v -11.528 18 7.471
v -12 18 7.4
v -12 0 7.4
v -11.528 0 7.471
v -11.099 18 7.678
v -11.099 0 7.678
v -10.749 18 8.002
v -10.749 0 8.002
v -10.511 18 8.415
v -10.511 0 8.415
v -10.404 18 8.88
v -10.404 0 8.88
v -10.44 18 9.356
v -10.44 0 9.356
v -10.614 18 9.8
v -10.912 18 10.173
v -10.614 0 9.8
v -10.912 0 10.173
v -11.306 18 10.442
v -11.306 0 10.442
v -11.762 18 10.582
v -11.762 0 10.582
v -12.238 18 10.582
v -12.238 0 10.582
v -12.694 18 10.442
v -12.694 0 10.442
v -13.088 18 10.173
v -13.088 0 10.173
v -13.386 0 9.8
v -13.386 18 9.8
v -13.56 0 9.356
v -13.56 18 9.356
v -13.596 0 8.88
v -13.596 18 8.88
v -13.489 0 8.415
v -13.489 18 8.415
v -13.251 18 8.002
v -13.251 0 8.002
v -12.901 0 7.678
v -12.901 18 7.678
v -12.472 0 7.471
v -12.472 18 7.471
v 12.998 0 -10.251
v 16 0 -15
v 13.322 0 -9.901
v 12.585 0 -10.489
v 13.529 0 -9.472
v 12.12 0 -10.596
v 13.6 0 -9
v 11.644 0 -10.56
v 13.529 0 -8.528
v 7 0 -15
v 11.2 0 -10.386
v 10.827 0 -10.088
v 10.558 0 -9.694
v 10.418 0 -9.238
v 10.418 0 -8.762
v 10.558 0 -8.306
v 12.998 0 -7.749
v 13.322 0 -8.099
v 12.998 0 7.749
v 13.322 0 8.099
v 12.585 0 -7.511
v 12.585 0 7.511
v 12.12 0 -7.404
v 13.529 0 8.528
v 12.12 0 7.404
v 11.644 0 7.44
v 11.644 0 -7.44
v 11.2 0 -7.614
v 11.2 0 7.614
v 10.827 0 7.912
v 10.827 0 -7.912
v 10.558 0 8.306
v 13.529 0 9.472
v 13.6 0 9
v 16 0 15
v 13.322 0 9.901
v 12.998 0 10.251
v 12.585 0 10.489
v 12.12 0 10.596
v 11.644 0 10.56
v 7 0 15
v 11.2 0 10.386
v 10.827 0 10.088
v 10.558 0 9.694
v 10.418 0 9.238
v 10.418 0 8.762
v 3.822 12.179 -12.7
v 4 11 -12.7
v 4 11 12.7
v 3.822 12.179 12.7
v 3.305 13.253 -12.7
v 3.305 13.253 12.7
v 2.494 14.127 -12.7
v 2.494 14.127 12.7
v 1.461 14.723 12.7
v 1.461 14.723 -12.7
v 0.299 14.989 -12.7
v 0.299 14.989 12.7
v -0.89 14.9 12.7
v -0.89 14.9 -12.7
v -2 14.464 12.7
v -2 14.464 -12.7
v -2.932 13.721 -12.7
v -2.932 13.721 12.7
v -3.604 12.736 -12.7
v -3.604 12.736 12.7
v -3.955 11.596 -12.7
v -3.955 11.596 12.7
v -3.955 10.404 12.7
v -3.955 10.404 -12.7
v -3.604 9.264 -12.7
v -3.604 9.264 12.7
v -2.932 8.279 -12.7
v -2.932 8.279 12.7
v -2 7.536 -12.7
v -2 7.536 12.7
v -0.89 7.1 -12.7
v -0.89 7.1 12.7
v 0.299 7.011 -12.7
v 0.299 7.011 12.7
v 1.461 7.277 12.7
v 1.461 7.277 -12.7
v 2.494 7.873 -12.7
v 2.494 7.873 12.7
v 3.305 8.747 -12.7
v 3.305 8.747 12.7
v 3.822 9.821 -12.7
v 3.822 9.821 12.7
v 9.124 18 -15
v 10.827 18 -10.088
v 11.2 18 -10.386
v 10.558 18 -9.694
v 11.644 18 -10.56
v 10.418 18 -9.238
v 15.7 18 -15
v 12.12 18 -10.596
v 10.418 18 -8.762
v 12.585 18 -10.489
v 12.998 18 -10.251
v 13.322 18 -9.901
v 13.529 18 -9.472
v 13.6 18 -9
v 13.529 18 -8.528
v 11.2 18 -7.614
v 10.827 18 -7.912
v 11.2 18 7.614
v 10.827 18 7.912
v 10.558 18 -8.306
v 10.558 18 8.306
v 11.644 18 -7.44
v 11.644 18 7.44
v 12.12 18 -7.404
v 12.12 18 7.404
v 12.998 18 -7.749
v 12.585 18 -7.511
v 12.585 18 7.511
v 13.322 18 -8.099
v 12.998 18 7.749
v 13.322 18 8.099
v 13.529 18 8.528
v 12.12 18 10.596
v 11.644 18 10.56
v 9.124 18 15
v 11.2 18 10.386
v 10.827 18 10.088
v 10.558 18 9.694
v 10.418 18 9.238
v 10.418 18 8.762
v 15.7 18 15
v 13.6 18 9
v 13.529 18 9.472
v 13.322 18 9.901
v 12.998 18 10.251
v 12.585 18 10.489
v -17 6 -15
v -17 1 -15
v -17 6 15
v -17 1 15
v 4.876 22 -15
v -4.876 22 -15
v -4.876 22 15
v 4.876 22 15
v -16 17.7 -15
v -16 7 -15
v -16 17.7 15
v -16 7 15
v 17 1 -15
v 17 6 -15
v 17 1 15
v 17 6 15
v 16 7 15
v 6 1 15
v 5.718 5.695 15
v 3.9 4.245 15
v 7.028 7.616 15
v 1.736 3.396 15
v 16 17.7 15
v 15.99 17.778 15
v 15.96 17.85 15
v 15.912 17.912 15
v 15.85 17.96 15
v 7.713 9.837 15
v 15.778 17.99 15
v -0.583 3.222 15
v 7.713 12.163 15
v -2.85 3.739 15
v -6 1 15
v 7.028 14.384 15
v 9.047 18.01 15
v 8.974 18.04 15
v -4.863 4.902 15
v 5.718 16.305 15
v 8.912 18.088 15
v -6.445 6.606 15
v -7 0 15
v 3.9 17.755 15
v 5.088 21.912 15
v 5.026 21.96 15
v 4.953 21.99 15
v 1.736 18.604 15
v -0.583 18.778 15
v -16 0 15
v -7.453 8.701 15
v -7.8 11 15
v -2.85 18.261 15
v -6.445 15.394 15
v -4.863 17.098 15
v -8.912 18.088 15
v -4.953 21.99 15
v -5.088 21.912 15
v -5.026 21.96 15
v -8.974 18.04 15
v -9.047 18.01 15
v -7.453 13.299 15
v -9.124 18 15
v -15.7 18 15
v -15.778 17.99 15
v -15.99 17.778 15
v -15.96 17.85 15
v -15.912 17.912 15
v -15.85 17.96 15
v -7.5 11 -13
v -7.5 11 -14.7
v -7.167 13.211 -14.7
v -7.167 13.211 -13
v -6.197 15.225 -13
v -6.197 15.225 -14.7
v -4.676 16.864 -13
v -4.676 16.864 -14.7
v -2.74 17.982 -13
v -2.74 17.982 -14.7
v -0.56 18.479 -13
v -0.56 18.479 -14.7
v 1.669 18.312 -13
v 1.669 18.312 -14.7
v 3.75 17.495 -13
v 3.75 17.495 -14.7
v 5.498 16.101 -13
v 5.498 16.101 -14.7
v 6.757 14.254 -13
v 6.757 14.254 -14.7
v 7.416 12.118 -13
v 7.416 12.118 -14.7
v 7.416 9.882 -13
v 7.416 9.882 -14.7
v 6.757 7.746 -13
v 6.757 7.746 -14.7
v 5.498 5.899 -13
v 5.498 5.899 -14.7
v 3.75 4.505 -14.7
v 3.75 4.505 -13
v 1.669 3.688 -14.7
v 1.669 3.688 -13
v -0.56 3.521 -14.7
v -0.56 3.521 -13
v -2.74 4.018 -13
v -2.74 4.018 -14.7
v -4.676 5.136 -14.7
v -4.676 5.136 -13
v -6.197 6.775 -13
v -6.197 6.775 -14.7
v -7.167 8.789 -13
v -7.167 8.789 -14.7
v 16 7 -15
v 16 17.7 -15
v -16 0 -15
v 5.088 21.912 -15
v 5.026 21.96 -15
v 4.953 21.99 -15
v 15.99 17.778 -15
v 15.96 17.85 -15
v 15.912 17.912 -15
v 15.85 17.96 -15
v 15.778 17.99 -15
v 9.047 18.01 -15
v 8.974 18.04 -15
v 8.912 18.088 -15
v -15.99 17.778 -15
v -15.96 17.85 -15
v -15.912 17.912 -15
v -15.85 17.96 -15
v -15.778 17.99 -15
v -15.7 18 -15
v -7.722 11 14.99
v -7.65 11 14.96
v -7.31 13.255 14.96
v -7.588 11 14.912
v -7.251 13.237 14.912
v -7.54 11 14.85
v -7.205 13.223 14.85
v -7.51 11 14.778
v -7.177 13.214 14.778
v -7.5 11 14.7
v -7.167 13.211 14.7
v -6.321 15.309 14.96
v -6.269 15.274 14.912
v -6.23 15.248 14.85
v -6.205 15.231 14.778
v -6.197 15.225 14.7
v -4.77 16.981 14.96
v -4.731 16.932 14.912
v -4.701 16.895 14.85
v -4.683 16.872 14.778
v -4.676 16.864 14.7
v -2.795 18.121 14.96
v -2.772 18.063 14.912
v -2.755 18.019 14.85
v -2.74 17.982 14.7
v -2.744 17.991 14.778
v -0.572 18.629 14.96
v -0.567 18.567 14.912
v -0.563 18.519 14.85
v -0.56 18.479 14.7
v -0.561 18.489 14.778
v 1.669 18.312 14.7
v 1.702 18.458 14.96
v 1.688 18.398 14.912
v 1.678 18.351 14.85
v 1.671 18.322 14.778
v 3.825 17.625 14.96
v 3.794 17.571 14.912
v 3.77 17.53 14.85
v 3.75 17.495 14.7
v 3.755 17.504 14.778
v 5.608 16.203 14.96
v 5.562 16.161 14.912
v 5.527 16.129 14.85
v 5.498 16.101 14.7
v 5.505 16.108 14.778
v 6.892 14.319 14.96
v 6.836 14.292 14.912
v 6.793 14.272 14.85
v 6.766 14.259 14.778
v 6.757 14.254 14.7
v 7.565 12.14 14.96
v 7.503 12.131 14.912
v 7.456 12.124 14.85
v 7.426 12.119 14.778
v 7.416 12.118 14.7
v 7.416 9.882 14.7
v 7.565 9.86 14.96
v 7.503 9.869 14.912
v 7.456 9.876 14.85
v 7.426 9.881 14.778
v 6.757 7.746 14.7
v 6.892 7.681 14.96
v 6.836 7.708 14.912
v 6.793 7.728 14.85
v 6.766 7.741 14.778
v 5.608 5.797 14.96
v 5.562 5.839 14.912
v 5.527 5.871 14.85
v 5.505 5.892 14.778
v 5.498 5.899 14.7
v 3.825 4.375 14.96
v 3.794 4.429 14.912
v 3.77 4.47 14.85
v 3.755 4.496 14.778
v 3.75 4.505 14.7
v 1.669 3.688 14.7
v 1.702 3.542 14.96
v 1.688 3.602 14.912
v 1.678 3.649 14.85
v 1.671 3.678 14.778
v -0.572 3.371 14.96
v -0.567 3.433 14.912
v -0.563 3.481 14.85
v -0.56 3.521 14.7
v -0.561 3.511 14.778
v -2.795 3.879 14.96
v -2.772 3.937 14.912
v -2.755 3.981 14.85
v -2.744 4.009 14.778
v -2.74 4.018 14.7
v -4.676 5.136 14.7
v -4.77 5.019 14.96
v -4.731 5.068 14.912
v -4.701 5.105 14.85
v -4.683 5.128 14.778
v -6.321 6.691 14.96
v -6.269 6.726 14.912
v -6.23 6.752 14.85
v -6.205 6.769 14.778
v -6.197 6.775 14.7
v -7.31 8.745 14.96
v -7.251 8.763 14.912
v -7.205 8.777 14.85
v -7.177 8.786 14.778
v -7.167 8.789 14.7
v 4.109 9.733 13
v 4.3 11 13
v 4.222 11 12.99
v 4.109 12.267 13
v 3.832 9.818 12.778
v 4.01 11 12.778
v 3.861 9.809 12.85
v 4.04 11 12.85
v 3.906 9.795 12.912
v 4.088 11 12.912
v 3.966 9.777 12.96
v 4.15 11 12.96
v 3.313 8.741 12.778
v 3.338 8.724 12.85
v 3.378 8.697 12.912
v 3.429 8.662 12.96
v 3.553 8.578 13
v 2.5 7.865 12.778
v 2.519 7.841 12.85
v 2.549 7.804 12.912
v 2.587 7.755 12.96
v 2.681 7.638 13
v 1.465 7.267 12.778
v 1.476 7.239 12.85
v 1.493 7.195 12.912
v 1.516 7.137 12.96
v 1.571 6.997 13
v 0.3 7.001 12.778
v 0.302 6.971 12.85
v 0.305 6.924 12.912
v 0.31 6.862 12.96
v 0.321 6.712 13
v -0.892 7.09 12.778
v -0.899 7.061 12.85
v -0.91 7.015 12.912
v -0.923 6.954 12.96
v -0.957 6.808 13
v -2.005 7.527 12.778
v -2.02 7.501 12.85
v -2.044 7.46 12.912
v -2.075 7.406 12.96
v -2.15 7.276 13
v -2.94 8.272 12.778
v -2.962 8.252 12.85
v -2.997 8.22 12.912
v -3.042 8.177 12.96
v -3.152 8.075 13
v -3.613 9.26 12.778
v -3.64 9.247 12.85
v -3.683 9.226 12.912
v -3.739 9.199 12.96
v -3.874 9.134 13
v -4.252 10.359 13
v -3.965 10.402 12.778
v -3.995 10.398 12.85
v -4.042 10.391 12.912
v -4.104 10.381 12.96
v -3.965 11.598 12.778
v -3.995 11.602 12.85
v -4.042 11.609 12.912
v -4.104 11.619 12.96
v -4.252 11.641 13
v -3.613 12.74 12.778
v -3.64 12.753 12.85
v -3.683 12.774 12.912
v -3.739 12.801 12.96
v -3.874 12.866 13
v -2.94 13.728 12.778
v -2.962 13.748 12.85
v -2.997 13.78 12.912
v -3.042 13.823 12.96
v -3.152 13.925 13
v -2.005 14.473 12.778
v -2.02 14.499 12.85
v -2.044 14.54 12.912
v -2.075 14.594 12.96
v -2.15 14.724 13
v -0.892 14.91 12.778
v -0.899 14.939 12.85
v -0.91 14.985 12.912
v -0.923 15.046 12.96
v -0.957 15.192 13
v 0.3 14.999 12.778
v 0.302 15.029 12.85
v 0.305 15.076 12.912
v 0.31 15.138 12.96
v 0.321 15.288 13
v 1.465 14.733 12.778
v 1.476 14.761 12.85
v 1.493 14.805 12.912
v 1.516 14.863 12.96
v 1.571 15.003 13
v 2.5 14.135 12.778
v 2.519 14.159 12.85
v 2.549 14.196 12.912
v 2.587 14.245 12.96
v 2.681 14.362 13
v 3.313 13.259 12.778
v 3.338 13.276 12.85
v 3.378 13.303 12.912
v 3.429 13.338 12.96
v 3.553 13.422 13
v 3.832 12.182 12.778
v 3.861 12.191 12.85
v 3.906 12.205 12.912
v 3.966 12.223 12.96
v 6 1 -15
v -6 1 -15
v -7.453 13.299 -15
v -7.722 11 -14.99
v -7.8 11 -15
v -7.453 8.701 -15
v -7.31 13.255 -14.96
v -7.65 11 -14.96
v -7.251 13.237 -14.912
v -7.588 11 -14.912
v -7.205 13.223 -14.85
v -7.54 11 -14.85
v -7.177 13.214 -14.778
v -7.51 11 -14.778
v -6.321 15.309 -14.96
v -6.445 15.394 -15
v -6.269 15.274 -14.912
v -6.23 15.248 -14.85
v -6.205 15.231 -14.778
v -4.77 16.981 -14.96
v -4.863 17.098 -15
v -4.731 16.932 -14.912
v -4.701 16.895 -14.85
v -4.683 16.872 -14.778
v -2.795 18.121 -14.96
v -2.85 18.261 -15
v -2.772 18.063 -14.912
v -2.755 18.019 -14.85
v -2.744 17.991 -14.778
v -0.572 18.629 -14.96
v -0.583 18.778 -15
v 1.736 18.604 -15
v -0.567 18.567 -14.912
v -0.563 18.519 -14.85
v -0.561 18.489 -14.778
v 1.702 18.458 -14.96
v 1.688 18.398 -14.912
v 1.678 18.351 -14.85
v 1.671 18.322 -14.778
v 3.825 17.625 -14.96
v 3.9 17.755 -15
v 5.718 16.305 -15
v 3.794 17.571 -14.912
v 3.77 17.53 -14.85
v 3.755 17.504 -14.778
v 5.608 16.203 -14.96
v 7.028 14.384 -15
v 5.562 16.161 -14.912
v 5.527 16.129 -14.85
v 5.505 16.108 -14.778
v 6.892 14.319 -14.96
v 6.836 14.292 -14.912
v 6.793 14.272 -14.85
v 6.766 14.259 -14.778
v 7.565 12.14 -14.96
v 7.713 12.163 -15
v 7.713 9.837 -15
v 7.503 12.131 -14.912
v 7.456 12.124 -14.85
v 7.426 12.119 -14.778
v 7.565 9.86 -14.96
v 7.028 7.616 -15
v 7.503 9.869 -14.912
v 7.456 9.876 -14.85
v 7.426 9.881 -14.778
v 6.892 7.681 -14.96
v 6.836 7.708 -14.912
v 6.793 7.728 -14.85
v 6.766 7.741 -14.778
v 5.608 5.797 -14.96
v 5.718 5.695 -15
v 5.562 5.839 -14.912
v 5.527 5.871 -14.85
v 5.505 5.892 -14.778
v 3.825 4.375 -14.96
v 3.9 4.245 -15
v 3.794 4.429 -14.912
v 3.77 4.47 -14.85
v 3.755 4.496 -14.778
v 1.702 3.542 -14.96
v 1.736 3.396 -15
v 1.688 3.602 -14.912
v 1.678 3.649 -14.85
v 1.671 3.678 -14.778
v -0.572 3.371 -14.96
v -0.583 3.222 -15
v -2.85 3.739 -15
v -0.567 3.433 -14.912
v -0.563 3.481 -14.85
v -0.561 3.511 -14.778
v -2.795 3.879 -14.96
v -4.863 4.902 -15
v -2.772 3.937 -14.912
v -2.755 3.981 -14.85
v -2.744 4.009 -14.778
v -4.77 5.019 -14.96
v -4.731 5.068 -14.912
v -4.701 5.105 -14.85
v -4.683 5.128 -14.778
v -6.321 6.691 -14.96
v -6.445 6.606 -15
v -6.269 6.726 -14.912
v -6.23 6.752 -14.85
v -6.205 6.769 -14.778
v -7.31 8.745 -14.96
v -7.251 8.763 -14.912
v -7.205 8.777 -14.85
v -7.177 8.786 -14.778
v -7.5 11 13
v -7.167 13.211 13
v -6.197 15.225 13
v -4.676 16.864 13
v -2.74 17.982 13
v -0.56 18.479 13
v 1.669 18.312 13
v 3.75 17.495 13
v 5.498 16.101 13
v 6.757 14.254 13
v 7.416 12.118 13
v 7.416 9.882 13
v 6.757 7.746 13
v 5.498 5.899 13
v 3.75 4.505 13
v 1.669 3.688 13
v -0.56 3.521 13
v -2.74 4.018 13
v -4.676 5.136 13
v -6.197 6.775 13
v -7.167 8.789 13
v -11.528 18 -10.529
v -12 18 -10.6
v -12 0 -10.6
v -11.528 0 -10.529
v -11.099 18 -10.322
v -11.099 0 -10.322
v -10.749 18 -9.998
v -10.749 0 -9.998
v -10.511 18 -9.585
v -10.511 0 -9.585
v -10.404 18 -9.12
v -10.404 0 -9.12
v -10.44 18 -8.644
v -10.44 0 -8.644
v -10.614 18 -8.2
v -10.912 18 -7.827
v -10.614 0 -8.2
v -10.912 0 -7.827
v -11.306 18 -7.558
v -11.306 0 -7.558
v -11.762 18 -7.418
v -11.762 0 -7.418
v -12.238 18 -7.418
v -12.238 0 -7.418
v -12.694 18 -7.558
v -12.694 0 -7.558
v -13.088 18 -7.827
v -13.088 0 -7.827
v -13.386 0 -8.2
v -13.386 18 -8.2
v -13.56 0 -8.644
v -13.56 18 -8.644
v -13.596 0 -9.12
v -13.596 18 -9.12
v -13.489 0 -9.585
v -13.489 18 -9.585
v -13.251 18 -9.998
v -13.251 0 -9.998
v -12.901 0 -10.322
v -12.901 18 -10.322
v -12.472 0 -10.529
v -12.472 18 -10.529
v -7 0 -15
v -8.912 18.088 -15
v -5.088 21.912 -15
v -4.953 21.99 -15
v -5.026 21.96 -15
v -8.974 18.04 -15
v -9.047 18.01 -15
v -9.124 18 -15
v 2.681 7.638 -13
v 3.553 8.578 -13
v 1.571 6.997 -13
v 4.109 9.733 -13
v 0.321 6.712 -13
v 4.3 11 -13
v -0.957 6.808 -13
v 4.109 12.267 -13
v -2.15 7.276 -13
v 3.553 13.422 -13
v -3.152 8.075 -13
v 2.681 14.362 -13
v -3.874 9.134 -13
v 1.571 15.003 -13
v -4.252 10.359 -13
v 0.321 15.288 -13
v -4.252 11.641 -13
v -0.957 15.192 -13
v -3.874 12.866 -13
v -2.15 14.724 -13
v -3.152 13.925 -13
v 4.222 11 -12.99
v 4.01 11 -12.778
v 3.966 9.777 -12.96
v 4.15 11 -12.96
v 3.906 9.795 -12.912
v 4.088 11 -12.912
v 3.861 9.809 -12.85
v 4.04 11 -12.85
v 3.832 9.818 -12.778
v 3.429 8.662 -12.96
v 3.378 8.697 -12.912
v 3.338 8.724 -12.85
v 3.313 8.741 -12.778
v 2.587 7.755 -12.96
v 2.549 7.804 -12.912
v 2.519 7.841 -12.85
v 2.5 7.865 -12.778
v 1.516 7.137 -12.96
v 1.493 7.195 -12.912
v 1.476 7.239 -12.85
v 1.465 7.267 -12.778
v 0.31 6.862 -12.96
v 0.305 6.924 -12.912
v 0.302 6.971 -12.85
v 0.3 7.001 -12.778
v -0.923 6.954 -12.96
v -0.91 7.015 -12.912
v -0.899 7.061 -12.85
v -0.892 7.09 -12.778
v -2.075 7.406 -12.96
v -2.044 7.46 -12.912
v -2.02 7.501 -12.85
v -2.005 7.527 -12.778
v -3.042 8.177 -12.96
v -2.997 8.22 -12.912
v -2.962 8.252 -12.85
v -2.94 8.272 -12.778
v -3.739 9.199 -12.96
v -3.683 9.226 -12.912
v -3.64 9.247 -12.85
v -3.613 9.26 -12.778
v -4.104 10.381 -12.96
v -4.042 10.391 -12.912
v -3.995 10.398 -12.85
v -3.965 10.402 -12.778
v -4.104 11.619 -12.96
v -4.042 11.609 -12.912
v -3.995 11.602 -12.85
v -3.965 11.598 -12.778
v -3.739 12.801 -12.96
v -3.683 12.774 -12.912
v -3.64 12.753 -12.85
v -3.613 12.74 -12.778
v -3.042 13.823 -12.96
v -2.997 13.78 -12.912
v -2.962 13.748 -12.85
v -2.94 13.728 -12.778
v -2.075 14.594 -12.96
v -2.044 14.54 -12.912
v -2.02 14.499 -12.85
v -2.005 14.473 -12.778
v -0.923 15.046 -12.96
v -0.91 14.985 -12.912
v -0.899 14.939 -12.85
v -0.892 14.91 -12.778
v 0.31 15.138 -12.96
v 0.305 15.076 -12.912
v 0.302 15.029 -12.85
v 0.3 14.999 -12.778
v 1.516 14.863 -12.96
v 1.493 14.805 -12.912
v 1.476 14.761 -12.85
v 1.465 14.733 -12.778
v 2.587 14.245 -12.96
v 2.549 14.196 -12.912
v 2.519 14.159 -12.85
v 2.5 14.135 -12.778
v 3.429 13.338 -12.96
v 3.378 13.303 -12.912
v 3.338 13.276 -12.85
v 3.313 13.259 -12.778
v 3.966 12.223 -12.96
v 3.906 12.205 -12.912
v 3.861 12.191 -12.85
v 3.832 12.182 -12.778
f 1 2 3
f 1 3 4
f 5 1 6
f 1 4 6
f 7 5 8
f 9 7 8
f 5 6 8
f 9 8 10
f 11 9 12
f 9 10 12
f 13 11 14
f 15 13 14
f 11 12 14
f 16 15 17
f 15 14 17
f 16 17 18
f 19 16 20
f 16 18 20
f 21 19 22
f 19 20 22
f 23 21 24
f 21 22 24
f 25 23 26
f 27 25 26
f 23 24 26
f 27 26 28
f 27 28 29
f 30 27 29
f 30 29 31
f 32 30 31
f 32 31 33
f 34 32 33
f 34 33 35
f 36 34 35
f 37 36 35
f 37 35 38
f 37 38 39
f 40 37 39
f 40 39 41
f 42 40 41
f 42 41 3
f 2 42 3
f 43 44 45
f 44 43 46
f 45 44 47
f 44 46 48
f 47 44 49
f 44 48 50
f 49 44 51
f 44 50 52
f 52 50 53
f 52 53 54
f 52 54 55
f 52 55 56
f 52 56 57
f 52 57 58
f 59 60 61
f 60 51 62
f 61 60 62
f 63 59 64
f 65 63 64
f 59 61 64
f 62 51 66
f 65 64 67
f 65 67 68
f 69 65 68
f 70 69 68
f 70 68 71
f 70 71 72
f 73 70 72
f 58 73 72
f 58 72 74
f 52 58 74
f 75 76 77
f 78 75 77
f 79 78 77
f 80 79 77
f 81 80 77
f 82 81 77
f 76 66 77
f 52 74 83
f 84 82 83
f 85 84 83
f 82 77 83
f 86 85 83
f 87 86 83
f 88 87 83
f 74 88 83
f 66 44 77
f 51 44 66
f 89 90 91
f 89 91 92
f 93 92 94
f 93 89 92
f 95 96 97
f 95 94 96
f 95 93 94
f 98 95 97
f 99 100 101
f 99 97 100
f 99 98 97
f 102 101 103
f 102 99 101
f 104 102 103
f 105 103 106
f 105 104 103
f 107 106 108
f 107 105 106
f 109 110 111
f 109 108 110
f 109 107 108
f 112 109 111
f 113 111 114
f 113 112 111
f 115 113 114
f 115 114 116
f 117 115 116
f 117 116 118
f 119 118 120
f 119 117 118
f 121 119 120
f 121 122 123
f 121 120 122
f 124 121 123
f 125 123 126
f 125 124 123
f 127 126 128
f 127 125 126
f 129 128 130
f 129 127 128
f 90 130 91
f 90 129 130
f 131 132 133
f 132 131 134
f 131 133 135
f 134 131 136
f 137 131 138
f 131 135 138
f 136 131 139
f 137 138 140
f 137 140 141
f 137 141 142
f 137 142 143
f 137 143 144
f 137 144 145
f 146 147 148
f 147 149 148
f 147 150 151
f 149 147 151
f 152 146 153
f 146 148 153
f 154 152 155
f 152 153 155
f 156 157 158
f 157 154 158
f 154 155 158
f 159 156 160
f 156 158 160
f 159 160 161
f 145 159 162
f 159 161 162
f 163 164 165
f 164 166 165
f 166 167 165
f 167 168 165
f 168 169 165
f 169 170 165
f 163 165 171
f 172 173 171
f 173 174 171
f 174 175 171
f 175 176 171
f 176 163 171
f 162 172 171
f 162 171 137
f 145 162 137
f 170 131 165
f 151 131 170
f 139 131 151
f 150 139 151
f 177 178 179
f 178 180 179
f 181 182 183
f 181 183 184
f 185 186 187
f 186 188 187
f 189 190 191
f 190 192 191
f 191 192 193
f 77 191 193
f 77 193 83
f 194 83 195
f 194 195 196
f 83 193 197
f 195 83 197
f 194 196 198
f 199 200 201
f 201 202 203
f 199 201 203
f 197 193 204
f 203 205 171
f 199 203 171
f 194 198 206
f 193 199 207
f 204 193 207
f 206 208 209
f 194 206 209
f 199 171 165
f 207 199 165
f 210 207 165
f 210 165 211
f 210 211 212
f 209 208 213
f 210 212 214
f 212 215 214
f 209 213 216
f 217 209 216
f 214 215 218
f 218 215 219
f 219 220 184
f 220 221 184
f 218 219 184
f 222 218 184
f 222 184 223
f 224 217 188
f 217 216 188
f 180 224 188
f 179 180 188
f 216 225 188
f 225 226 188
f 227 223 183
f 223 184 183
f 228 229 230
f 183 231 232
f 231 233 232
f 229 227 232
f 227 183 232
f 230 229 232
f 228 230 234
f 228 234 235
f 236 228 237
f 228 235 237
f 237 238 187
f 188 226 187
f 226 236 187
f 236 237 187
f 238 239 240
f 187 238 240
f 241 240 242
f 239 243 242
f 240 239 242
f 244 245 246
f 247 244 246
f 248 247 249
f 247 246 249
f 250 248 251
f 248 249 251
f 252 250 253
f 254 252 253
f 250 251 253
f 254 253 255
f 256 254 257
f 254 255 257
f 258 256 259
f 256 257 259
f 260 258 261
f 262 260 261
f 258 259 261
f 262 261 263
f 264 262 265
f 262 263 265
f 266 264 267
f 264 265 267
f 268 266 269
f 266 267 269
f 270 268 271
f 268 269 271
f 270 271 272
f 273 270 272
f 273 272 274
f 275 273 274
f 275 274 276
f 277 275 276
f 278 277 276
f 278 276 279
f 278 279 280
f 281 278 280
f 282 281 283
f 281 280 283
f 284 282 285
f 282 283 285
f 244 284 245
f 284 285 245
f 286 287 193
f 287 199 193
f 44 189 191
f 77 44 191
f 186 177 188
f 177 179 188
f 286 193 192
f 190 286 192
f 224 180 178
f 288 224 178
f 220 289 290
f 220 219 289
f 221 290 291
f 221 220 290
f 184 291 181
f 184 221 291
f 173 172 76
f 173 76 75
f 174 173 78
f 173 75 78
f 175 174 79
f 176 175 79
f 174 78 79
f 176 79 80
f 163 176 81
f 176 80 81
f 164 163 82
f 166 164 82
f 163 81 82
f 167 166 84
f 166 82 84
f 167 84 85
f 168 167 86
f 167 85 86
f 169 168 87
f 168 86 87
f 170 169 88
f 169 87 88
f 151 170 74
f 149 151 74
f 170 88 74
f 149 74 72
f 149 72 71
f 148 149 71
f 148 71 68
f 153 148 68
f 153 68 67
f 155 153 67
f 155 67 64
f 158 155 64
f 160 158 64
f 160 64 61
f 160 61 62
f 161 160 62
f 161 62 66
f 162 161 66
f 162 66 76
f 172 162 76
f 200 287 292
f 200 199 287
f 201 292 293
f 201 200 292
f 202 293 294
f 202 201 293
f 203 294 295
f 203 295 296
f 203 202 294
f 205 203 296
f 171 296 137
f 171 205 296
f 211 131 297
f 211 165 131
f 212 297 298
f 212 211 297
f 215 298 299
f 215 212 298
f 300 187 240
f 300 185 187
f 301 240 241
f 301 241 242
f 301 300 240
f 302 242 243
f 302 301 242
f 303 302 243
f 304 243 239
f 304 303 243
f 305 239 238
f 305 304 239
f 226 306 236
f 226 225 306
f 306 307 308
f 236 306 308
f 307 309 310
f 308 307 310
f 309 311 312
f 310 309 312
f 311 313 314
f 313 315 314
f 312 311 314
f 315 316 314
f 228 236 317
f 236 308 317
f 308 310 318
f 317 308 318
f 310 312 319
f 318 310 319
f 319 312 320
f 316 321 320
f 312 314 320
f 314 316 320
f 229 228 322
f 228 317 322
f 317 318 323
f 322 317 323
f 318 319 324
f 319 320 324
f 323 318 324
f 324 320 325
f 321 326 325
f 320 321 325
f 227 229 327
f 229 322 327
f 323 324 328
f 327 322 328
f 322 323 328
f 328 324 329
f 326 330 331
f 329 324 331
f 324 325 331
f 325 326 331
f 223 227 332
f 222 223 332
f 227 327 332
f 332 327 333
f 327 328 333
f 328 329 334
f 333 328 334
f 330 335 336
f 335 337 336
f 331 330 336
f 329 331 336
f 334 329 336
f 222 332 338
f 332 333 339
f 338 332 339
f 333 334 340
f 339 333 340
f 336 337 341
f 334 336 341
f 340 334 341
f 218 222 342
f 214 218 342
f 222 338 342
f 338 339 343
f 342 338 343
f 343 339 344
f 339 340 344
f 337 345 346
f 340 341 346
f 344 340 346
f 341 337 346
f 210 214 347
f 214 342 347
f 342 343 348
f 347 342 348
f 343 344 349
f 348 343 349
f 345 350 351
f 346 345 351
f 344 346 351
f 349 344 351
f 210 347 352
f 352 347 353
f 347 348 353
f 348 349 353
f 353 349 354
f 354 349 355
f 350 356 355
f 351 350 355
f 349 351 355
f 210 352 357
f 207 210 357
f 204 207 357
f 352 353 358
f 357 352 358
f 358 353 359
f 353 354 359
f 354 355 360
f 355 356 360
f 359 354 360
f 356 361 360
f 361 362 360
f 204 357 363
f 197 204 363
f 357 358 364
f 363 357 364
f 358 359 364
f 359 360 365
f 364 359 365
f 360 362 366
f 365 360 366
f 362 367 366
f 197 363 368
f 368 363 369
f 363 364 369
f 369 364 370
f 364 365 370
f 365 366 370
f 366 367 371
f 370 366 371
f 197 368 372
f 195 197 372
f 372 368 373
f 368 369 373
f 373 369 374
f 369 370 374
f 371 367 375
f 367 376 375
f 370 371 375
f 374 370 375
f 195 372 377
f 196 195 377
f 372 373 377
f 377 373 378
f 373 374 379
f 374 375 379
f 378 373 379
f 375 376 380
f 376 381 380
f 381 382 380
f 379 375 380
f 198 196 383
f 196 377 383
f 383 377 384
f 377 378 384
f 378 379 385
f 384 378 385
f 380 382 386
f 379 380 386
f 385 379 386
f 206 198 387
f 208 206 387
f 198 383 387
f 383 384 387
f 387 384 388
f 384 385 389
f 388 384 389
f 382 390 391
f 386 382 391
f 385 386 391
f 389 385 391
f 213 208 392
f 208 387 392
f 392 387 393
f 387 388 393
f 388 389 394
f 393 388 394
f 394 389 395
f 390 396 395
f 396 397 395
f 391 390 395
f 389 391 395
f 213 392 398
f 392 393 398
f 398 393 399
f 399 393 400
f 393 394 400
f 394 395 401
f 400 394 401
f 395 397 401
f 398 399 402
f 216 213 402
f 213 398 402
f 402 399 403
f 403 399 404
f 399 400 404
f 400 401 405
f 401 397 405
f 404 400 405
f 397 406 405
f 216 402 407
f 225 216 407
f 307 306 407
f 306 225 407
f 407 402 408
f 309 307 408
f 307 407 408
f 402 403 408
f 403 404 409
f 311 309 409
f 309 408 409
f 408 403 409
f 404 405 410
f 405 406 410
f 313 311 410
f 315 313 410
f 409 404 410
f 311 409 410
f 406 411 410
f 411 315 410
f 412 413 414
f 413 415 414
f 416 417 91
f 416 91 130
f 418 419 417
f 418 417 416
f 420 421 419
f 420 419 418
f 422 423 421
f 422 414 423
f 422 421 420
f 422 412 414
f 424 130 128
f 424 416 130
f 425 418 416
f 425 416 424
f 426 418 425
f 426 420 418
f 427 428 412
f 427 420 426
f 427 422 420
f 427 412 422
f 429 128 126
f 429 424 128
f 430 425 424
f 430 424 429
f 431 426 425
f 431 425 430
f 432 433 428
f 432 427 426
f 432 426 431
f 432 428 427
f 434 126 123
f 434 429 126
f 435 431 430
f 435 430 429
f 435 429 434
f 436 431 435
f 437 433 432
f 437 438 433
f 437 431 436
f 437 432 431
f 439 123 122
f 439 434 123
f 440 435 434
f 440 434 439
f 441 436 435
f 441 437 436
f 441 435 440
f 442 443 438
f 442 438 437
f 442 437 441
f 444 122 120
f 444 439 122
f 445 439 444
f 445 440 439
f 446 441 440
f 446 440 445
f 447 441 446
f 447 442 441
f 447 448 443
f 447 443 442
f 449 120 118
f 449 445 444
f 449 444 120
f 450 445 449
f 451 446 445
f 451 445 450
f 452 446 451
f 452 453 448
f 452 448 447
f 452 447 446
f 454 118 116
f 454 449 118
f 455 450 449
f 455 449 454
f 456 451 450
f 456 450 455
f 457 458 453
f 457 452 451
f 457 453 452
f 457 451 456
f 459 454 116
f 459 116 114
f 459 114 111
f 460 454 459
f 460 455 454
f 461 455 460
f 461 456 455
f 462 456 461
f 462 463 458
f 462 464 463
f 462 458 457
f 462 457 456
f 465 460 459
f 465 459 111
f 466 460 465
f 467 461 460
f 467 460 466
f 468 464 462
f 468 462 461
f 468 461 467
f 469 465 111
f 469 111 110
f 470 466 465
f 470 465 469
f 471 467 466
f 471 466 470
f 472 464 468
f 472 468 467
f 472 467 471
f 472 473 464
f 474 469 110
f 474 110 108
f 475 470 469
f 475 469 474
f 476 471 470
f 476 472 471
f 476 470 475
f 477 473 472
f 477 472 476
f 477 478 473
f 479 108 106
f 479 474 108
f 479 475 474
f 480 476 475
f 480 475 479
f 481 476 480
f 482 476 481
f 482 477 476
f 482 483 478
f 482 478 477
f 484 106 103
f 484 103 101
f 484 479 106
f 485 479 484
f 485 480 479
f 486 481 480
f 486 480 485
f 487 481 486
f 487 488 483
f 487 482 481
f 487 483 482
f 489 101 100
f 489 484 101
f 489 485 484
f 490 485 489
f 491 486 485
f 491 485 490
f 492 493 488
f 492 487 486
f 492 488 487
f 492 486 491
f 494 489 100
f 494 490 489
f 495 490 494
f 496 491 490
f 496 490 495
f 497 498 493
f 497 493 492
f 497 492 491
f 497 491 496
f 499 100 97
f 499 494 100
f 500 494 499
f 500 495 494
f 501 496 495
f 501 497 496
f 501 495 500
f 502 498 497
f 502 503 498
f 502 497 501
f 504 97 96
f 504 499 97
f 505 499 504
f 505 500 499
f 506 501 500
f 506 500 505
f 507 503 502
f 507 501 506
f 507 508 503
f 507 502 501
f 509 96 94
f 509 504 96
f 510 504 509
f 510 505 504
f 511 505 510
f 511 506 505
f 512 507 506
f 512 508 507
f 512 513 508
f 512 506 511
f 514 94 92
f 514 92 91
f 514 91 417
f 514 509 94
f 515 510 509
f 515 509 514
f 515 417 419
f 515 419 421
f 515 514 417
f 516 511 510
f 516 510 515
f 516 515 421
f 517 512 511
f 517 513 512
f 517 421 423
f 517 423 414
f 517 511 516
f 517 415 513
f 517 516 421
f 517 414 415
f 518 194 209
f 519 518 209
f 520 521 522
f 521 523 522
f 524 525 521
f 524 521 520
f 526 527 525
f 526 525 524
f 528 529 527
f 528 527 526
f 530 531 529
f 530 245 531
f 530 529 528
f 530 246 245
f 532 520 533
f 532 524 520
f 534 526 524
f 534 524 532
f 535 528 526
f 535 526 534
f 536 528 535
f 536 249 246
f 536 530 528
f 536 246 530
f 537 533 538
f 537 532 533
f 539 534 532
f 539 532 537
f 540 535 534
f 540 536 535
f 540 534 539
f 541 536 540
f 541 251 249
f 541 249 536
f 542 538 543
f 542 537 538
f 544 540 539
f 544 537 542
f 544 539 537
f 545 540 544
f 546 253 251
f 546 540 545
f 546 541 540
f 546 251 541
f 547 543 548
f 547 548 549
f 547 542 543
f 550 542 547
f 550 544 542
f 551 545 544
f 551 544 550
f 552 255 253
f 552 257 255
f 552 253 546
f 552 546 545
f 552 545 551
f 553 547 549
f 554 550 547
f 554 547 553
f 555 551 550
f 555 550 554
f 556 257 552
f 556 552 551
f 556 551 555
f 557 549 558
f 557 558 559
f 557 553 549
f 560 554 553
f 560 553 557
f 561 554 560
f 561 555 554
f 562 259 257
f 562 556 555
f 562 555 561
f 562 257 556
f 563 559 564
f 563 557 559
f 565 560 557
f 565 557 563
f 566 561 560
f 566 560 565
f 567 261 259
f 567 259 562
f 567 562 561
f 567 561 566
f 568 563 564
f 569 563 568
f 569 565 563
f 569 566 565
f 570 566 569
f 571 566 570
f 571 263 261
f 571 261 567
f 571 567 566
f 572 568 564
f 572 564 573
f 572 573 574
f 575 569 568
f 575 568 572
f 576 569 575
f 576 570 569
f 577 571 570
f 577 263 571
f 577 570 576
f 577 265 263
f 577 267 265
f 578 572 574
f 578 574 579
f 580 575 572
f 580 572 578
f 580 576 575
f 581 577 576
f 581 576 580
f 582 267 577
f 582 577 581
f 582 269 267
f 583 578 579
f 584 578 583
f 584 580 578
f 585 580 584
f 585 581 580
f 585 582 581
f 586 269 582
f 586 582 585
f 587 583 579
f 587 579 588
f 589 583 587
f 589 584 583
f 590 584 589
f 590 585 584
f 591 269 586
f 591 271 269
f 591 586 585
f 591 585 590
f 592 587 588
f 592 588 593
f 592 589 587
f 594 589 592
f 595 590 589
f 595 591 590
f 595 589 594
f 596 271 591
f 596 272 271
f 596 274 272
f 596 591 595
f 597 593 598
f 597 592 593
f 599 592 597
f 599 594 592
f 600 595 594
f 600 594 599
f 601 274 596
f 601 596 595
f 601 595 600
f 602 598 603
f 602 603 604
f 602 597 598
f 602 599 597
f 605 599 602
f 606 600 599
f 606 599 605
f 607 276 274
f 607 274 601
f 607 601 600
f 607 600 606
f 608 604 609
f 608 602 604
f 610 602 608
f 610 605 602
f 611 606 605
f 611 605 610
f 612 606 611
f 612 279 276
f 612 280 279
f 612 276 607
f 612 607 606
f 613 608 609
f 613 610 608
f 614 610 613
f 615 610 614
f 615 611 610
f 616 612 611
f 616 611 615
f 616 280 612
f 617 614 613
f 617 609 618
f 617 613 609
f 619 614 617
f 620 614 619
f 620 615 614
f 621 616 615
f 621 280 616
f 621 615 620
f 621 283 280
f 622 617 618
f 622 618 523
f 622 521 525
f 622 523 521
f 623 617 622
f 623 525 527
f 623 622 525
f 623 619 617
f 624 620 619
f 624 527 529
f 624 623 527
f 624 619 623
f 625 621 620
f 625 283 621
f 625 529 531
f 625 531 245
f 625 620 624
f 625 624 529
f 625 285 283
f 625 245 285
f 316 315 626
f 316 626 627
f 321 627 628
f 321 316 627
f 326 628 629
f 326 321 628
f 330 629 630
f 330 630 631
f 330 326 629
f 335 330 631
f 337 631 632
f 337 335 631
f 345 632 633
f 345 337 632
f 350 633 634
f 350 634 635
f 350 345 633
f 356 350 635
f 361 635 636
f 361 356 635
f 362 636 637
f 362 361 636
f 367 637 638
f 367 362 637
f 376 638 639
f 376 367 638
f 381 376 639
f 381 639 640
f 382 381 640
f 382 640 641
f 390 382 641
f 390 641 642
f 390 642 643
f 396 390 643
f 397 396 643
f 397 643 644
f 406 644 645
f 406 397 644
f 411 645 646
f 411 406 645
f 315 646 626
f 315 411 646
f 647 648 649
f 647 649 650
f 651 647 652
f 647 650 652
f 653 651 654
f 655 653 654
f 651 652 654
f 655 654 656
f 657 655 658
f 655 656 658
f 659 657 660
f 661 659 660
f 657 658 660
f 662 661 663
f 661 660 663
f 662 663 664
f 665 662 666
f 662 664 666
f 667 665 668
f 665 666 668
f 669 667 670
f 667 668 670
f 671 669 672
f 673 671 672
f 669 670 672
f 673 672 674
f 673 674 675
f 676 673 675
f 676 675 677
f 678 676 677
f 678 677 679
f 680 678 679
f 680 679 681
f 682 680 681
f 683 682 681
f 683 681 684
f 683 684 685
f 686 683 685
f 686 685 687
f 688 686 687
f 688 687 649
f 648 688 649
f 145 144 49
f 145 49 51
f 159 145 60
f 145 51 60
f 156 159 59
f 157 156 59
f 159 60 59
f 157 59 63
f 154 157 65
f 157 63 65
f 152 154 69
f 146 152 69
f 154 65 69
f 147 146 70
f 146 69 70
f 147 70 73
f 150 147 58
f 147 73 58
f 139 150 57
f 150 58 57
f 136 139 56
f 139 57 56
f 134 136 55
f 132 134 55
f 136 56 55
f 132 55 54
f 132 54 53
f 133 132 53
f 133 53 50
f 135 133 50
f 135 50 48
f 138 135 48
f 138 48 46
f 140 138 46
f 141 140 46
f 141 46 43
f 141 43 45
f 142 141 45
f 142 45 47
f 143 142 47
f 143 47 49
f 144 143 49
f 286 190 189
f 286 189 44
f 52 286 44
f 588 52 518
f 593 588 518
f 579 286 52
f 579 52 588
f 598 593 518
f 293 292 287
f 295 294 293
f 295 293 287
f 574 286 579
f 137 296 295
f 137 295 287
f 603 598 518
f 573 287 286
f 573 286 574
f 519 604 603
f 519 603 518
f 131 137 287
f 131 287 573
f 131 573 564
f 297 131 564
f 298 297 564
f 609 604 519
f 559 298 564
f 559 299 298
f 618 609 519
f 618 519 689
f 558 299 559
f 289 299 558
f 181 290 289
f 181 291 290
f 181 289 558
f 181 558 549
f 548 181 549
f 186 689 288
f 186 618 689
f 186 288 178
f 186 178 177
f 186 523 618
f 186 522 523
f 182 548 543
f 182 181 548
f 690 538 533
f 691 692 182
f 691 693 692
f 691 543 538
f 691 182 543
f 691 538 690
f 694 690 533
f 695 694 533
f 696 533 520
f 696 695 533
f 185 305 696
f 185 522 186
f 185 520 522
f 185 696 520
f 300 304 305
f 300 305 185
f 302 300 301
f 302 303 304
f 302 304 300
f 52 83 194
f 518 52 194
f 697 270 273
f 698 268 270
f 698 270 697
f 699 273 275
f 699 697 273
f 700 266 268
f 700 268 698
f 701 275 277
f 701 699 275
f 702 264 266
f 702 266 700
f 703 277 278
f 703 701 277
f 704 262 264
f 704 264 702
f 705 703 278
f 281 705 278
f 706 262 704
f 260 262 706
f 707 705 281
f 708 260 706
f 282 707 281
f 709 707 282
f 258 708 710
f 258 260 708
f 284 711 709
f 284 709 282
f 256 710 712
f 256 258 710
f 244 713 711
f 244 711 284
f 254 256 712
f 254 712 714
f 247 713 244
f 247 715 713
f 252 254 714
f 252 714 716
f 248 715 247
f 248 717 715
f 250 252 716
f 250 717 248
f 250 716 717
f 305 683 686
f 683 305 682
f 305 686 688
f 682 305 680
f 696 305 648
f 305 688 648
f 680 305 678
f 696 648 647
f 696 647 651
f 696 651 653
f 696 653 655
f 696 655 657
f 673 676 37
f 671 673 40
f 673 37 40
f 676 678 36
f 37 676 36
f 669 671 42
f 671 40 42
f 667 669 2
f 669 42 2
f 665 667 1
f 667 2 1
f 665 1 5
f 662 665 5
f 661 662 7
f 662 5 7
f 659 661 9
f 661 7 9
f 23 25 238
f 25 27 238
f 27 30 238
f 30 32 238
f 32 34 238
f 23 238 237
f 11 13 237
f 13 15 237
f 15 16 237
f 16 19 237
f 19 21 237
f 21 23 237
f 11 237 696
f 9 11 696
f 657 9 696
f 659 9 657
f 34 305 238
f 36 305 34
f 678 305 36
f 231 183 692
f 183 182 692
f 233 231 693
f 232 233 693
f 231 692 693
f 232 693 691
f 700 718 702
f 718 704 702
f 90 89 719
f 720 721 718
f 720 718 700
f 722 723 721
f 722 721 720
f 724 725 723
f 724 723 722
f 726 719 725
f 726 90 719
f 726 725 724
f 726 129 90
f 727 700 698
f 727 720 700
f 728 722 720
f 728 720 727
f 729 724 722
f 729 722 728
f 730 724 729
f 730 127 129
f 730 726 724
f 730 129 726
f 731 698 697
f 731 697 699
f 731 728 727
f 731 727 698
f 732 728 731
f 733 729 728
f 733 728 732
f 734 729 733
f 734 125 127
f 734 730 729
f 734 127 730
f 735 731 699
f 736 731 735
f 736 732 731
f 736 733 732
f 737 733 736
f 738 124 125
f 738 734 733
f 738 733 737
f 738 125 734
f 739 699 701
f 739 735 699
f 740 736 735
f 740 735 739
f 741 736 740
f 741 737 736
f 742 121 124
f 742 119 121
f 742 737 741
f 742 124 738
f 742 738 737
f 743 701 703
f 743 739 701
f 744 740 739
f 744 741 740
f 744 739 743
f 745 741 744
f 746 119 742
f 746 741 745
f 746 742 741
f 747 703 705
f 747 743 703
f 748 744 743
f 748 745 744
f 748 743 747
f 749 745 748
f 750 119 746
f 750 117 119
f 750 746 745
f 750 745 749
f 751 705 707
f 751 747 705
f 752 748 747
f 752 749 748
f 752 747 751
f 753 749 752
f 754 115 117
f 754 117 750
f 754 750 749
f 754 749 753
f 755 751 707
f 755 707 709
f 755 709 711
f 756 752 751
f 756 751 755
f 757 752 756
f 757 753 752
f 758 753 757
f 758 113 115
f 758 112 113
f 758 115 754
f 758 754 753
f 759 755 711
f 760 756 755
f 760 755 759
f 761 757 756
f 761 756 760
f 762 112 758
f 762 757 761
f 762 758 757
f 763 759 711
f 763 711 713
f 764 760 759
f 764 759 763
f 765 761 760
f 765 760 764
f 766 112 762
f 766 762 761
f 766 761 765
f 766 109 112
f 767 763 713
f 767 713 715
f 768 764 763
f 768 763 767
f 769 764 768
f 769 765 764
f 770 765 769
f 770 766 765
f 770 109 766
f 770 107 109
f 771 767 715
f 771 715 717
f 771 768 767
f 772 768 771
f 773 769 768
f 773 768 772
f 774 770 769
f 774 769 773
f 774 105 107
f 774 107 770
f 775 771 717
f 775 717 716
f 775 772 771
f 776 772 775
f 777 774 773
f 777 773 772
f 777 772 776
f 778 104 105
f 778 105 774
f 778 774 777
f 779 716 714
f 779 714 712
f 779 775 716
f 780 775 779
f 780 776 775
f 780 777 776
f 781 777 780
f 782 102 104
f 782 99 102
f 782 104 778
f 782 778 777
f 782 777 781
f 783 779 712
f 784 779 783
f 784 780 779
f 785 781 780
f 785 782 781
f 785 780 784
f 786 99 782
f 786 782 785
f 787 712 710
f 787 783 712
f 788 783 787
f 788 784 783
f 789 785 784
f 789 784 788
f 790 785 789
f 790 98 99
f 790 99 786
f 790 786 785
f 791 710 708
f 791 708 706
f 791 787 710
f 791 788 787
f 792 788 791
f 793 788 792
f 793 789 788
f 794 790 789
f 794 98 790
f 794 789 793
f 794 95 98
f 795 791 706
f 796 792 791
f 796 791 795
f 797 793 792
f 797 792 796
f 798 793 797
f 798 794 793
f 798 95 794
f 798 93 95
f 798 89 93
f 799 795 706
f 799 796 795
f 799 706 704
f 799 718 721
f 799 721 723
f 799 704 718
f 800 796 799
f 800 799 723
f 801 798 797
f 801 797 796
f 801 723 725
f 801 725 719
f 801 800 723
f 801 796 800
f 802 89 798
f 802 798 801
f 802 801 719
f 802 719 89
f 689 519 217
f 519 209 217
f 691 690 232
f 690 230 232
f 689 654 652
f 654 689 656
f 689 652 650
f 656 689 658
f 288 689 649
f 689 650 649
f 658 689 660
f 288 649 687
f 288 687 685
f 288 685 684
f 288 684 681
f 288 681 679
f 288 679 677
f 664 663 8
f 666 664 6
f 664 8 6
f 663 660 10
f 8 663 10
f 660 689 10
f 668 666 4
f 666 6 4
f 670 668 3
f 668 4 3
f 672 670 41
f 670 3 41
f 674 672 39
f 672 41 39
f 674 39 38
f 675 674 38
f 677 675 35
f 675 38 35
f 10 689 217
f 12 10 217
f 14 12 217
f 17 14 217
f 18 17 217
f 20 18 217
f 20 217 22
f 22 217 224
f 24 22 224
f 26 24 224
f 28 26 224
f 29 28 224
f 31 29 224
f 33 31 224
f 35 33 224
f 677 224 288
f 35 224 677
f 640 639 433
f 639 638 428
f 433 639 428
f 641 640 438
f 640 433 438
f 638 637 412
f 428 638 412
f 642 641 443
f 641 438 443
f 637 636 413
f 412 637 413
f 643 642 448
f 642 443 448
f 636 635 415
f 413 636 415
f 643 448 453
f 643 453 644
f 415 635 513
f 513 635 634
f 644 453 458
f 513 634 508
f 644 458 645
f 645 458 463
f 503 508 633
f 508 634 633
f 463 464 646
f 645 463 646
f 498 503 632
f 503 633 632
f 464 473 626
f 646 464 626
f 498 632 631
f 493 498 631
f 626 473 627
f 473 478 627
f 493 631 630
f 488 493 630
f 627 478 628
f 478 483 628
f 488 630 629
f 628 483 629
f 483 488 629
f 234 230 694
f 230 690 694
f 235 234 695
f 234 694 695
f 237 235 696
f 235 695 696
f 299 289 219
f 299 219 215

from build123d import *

# Parameters (mm, degrees)
SKETCH2_R           = 4
BOSS_EXTRUDE1_DEPTH = 15
SKETCH3_R           = 7.5
CUT_EXTRUDE1_DEPTH  = 2
SKETCH4_R           = 1.6
CUT_EXTRUDE2_DEPTH  = 32.591137998
CHAMFER1_SIZE       = 1
FILLET1_R           = 0.3


with BuildPart() as part:
    # Sketch2 → Boss-Extrude1 (new, symmetric)
    with BuildSketch(Plane.XY):
        Polygon((6, 1), (-6, 1), (-7, 0), (-17, 0), (-17, 6), (-16, 7), (-16, 18), (-9, 18), (-5, 22), (5, 22), (9, 18), (16, 18), (16, 7), (17, 6), (17, 0), (7, 0), align=None)
        with Locations((0, 11)):
            Circle(SKETCH2_R, mode=Mode.SUBTRACT)
    extrude(amount=BOSS_EXTRUDE1_DEPTH, both=True)

    # Sketch3 → Cut-Extrude1 (cut)
    with BuildSketch(Plane(origin=(0, 0, -15), x_dir=(-1, 0, 0), z_dir=(0, 0, -1))):
        with Locations((0, 11)):
            Circle(SKETCH3_R)
    cut_extrude1 = extrude(amount=-CUT_EXTRUDE1_DEPTH, mode=Mode.SUBTRACT)

    # Mirror1: Cut-Extrude1 across plane
    add(cut_extrude1.mirror(Plane.XY), mode=Mode.SUBTRACT)

    # Sketch4 → Cut-Extrude2 (cut, through all)
    with BuildSketch(Plane(origin=(0, 0, 0), x_dir=(-1, 0, 0), z_dir=(0, -1, 0))):
        with Locations(Location((-12, 9, 0), (0, 0, 180))):
            Circle(SKETCH4_R)
        with Locations(Location((12, 9, 0), (0, 0, 90))):
            Circle(SKETCH4_R)
        with Locations(Location((-12, -9, 0), (0, 0, 180))):
            Circle(SKETCH4_R)
        with Locations(Location((12, -9, 0), (0, 0, 90))):
            Circle(SKETCH4_R)
    extrude(amount=-CUT_EXTRUDE2_DEPTH, mode=Mode.SUBTRACT)

    # Chamfer1
    chamfer1_edges = [part.edges().sort_by_distance(p)[0] for p in [
        (-17, 0, 0),
        (17, 0, 0),
    ]]
    chamfer(chamfer1_edges, length=CHAMFER1_SIZE)

    # Fillet1
    fillet1_edges = [part.edges().sort_by_distance(p)[0] for p in [
        (-16, 18, 0),
        (-9, 18, 0),
        (-5, 22, 0),
        (5, 22, 0),
        (9, 18, 0),
        (16, 18, 0),
        (-4, 11, -13),
        (7.5, 11, -15),
        (7.5, 11, 15),
        (-4, 11, 13),
    ]]
    fillet(fillet1_edges, radius=FILLET1_R)


solid = part.part
